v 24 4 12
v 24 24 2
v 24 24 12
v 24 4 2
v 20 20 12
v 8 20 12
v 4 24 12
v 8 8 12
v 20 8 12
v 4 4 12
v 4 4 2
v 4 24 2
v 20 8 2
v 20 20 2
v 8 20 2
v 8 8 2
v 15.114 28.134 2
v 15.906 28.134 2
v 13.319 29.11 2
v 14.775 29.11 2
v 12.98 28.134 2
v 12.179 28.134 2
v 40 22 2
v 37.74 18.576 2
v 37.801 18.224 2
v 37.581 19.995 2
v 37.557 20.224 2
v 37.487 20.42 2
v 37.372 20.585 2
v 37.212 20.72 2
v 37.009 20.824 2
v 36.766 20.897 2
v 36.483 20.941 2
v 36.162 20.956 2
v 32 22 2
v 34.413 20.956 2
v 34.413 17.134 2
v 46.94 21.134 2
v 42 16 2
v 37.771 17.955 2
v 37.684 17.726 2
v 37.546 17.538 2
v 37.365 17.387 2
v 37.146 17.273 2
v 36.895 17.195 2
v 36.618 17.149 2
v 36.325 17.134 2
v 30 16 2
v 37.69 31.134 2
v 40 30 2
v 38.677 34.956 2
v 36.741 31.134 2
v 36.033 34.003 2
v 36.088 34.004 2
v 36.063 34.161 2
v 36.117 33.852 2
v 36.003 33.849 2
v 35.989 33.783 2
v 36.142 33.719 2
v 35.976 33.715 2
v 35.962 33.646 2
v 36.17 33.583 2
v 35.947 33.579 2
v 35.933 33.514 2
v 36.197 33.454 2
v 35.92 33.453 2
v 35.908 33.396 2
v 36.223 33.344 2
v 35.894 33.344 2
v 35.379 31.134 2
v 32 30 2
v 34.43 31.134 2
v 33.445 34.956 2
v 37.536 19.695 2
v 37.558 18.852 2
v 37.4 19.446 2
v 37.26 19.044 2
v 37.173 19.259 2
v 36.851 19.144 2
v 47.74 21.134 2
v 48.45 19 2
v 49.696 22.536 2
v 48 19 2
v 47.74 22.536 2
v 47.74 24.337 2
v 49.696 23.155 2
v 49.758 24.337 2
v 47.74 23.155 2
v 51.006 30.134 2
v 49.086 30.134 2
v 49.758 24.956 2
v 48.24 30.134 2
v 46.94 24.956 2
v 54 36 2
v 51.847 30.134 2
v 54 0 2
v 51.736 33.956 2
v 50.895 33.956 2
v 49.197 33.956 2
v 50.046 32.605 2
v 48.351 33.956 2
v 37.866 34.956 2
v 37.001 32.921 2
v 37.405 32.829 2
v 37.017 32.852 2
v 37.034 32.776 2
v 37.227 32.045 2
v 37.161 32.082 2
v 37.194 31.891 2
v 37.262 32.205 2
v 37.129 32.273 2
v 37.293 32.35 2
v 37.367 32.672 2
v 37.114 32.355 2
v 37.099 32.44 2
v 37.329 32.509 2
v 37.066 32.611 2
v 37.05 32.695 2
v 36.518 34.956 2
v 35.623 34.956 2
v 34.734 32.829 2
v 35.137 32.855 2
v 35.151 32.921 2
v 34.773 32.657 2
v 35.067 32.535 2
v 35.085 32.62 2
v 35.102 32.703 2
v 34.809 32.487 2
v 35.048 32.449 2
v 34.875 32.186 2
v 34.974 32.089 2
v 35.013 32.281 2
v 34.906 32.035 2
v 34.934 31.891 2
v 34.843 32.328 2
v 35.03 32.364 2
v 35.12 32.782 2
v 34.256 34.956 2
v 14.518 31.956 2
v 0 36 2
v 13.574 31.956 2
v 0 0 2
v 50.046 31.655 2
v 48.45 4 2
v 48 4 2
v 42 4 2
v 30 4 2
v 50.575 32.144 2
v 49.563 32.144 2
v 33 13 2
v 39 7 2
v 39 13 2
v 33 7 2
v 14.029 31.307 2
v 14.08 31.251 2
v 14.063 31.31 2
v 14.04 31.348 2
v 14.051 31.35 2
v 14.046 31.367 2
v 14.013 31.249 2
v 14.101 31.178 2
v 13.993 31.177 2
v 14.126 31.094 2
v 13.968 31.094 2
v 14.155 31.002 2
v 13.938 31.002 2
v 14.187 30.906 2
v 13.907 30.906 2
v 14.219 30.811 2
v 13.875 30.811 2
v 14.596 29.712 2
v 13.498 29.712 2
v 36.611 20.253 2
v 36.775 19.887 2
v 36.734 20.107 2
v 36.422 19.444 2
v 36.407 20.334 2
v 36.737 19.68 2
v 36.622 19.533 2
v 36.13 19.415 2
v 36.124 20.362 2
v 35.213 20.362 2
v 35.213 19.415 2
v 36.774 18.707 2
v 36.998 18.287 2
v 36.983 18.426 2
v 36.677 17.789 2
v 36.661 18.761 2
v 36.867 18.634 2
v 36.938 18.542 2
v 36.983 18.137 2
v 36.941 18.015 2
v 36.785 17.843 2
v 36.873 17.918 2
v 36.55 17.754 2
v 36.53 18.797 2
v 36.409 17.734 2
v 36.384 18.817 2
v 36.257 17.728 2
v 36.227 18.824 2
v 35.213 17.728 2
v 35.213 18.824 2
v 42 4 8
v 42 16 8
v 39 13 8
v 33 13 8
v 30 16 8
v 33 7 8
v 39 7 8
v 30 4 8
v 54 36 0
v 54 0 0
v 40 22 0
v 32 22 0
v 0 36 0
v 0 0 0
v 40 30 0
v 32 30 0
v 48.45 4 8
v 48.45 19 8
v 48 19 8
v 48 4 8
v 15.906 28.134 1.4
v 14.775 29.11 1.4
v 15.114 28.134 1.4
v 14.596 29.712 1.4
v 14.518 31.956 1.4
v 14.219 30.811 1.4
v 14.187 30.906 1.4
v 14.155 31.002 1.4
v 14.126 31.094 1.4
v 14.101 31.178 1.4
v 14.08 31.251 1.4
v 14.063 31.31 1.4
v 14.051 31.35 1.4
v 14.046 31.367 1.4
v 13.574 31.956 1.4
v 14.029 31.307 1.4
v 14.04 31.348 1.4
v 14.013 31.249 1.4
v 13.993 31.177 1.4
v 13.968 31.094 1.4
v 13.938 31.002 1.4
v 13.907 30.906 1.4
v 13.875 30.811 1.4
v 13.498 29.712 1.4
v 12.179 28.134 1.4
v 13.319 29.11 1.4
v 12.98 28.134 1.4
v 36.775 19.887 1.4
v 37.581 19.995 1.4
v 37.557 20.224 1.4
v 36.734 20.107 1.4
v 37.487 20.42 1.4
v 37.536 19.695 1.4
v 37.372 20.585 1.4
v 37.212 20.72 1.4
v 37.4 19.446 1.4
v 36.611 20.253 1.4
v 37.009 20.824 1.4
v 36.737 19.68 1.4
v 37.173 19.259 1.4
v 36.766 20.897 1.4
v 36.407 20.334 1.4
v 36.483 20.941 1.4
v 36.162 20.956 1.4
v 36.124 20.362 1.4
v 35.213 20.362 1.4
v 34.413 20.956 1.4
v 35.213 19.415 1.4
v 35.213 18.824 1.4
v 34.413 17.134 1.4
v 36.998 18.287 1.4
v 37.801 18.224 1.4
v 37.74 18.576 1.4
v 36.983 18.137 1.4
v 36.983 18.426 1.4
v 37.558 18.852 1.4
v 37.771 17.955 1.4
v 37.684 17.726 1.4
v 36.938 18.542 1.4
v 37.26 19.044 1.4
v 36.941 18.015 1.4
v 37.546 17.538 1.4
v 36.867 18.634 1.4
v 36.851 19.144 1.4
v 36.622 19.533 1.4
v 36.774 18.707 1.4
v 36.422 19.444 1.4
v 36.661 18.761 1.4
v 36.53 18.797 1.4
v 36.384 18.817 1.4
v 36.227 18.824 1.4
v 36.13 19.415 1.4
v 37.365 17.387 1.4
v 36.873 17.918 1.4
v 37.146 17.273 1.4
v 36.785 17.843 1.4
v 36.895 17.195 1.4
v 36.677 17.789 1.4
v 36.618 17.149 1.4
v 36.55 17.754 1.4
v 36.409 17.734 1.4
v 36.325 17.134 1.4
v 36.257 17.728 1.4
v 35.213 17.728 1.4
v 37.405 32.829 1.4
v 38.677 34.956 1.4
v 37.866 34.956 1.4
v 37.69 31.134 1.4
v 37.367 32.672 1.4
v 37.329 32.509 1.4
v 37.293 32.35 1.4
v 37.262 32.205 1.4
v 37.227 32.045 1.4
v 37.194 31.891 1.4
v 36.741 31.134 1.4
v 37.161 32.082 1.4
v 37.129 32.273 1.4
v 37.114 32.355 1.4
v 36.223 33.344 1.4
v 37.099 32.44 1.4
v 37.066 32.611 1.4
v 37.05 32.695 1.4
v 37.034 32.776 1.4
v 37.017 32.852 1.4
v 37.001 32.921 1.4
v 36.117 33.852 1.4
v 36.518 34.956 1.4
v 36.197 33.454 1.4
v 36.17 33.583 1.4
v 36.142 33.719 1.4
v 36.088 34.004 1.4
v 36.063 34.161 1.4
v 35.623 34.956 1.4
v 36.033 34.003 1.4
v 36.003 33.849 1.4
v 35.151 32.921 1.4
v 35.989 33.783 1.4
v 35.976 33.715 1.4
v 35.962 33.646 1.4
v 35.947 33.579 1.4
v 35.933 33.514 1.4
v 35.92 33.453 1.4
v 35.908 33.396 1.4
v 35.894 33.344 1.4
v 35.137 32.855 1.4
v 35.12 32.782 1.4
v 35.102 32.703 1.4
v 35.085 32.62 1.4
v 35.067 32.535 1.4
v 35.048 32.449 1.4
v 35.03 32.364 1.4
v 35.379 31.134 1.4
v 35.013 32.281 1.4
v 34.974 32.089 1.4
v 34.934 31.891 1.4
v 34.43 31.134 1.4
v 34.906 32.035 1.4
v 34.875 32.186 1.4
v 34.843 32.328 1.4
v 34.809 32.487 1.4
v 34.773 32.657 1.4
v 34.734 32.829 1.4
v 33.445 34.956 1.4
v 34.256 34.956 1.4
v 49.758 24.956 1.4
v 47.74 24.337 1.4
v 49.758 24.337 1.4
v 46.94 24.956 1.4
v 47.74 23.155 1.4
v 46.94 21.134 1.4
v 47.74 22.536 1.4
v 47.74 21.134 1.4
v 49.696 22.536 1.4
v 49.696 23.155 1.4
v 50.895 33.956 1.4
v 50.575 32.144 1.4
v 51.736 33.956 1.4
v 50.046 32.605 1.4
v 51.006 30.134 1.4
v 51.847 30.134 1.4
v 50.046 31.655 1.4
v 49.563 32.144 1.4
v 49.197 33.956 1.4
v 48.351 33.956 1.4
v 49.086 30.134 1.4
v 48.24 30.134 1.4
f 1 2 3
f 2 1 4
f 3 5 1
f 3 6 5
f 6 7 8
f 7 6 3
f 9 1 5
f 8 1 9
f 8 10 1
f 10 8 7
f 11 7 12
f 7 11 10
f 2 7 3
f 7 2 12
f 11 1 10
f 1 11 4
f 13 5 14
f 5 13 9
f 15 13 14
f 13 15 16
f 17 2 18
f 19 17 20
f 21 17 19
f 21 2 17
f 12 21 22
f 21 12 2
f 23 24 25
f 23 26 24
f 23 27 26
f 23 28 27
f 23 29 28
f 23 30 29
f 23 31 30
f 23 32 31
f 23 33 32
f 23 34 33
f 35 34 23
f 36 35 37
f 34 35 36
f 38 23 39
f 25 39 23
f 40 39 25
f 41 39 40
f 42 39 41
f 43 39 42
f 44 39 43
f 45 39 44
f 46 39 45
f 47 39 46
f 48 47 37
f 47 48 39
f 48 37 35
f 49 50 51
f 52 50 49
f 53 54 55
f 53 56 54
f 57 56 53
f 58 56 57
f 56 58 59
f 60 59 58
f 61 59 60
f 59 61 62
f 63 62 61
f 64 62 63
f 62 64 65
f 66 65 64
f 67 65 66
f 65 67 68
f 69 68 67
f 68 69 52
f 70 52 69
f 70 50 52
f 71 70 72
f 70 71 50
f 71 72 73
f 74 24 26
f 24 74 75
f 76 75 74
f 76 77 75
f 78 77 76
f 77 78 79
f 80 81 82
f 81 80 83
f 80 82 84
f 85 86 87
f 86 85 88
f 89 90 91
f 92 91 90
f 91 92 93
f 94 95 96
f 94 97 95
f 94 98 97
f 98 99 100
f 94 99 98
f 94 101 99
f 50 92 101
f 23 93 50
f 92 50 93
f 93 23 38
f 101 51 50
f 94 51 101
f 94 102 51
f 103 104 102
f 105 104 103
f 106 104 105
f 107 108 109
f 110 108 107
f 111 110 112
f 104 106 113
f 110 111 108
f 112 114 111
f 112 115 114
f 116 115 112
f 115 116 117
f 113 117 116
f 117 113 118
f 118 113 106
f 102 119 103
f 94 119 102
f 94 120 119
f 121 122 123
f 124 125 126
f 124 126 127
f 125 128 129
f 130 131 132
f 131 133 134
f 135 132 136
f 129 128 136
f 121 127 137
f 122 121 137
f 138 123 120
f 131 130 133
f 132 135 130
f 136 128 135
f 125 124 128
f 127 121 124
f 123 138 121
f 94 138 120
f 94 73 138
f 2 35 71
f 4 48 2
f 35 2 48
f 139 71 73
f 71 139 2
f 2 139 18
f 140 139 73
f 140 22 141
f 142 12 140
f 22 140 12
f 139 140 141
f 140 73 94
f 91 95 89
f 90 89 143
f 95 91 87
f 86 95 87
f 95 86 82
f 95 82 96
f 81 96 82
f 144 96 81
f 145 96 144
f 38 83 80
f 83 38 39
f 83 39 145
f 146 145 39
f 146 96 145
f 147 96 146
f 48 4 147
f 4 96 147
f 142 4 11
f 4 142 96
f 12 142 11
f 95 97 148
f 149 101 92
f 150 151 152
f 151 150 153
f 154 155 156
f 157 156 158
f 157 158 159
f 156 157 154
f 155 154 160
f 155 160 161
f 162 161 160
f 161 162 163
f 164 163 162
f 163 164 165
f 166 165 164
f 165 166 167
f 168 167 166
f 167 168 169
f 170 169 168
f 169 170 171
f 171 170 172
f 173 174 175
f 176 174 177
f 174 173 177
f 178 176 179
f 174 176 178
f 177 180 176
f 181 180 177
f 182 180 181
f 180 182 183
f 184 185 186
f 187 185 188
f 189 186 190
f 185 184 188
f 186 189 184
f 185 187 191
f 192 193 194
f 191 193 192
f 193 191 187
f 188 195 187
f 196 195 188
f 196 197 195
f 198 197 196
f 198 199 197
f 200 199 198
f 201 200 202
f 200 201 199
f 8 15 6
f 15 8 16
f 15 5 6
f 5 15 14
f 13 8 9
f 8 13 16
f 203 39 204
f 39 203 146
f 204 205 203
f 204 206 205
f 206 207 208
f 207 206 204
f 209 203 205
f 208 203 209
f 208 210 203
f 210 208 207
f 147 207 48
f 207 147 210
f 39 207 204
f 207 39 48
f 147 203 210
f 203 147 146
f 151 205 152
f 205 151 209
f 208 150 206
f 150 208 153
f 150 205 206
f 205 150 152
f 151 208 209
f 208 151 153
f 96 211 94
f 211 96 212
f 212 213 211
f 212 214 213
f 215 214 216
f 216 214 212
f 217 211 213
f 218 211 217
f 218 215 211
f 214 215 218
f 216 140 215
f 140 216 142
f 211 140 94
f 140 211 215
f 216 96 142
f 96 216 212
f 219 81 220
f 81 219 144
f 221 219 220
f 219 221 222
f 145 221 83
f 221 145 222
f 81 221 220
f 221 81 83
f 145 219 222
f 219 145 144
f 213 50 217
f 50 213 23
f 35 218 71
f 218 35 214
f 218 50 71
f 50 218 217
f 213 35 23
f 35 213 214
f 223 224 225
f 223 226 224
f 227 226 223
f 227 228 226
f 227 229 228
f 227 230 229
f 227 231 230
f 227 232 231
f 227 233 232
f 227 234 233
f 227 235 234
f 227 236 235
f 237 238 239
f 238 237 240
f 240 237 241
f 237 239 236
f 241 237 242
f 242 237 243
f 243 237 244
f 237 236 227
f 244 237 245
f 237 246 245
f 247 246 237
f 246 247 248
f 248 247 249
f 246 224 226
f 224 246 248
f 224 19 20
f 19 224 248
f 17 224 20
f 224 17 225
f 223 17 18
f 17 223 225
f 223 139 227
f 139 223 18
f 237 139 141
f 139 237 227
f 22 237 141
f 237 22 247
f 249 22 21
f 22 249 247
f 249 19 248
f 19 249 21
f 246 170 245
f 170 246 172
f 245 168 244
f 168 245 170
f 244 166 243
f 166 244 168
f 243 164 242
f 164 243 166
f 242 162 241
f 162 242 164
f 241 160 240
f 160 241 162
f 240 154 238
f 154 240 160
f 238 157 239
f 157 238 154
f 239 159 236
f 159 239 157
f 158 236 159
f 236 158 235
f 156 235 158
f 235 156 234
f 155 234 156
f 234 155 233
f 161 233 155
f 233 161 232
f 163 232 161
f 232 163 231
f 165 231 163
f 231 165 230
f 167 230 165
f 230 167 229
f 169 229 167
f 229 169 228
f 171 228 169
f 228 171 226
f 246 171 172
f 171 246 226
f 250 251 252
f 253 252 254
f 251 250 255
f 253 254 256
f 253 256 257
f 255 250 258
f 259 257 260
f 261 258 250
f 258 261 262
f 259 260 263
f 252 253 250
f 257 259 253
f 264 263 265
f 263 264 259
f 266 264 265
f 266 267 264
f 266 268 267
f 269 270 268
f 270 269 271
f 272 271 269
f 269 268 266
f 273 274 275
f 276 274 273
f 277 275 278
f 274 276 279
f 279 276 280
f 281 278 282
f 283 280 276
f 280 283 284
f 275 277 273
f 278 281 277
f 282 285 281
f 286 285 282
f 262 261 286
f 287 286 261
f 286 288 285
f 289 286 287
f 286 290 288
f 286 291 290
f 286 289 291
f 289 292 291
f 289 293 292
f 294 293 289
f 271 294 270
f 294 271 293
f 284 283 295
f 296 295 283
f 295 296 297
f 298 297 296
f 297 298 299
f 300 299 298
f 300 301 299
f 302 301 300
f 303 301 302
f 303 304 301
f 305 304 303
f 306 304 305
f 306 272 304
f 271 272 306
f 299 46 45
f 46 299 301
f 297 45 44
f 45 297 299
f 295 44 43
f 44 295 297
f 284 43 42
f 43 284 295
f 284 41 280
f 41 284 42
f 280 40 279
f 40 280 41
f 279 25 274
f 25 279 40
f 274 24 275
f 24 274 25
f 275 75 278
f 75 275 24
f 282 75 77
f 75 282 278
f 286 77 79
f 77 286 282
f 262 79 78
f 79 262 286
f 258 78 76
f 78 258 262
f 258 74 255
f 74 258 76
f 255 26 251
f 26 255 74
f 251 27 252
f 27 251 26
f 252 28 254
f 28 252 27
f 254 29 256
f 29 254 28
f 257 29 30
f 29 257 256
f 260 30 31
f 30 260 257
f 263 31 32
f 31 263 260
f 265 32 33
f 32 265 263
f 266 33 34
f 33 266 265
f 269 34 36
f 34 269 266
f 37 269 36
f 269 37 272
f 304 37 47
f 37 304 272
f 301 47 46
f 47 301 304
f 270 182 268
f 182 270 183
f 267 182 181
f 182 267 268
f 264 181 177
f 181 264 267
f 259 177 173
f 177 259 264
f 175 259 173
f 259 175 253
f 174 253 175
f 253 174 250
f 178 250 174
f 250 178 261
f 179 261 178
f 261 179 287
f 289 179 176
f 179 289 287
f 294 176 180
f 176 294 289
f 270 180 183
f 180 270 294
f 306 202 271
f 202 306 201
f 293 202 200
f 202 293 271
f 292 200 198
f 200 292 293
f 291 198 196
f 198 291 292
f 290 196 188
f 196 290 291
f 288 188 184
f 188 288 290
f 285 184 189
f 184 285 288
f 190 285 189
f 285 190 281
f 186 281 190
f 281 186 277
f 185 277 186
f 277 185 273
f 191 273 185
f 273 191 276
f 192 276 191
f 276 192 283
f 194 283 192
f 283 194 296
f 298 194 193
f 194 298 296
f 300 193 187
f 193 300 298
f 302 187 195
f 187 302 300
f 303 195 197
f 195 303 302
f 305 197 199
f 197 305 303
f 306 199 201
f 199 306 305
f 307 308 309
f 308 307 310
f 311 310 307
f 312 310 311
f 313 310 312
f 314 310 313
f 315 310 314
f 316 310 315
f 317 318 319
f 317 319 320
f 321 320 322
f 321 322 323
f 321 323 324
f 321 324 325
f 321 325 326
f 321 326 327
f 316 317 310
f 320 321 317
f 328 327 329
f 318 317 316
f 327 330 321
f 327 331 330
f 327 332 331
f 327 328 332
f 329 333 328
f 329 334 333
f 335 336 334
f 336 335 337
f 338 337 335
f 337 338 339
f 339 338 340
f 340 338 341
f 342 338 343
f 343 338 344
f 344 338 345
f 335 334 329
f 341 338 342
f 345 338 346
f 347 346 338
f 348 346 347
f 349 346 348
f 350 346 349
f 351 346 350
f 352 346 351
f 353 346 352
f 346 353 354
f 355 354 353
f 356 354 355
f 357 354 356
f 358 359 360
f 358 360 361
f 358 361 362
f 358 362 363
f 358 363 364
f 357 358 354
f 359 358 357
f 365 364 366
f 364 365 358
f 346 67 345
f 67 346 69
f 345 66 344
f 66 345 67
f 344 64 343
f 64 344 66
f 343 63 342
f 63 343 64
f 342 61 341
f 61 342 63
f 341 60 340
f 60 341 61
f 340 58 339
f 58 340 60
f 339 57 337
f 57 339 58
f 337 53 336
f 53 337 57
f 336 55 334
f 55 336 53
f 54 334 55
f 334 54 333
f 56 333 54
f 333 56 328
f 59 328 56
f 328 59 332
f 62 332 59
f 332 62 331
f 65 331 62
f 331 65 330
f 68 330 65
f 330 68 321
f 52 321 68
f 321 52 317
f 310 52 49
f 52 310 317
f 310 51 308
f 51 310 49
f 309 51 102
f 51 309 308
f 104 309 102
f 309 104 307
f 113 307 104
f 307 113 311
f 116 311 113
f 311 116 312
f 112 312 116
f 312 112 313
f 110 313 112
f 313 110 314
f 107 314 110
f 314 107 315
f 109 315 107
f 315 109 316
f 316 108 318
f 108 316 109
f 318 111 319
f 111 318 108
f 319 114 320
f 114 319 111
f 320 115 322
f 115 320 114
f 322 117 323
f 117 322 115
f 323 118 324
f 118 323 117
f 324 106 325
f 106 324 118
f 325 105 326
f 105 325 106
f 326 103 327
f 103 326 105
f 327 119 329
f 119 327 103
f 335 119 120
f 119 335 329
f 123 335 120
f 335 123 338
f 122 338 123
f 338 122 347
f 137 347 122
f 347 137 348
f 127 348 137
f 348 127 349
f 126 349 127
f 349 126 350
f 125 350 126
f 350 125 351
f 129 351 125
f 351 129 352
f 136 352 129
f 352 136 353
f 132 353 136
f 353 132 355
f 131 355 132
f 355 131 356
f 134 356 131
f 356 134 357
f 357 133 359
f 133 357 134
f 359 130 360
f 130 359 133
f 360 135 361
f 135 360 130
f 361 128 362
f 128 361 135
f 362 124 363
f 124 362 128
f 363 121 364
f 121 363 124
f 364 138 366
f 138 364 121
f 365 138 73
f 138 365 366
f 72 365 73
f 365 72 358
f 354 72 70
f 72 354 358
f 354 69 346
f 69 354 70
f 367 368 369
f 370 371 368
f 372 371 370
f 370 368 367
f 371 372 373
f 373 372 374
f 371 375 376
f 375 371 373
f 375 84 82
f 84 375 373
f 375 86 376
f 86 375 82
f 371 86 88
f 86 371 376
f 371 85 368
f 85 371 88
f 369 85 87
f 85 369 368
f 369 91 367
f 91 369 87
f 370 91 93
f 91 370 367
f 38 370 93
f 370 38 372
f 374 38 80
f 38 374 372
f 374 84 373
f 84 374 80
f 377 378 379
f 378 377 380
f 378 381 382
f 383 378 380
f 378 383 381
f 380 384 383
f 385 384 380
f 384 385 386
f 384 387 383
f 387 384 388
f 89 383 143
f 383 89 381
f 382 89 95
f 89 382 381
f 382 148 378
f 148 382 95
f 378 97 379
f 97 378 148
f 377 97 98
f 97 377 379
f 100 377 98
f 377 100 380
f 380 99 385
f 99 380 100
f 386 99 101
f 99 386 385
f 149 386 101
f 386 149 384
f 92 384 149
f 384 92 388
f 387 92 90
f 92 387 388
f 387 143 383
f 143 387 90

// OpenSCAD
// Print coupon: the printer's piece made to be measured. A plate with two square
// blocks standing on it, a square pocket in each, a square window through the plate
// and a single-wall fin, every size a person reads with calipers, each labelled.
// Its wrapper (apothecary/projects/parts/print_coupon.py) names each feature, the
// jaws that read it and where they close; apothecary/print_tuning.py says what the
// readings imply for the printer (docs/print-tuning.md).
//
// The plate's front-left bottom corner is the origin, its long side along X. Block A
// stands at the front left, block B to its right, the fin past B; the window is
// behind B. Everything stands on the plate, so nothing needs a support. Labels are
// cut into the plate's top, clear of every face a jaw meets.
//
//   outside sizes  the plate, X and Y (the jaws take in the first layer); A and B,
//                  X and Y (above it)
//   inside sizes   A's and B's pockets, X and Y (above the first layers); the
//                  window, X and Y (through them)
//   heights        the plate's top, B's and A's, from the bed face
//   a single wall  the fin, across

/* [Plate] */
plate_x = 54;       // [40:1:120] the plate along X, its long side
plate_y = 36;       // [30:1:100] the plate along Y
plate_t = 2;        // [1:0.2:6] the plate's thickness: the first top measured

/* [Blocks] */
a_size = 20;        // [10:1:40] block A, square
a_height = 10;      // [2:0.2:30] block A above the plate
a_pocket = 12;      // [4:1:30] block A's pocket, square, down to the plate
b_size = 12;        // [8:1:30] block B, square
b_height = 6;       // [2:0.2:30] block B above the plate
b_pocket = 6;       // [3:1:20] block B's pocket, square, down to the plate

/* [Window and fin] */
window = 8;         // [4:1:20] a square window through the plate, behind B
fin_t = 0.45;       // [0.2:0.01:1.2] the fin's thickness: one line of the slicer's
fin_length = 15;    // [5:1:30] the fin along Y
fin_height = 6;     // [2:0.2:20] the fin above the plate

/* [Room] */
margin = 4;         // [3:0.5:10] from the plate's edge to what stands on it
gap = 6;            // [4:0.5:12] between two features, room for a jaw
label_depth = 0.6;  // [0.2:0.2:1] how deep a label is cut into the plate's top

/* [Hidden] */
eps = 0.01;  // what stands on the plate starts this far into it, so the two are one
label_size = 4;

a_x0 = margin;
a_y0 = margin;
b_x0 = margin + a_size + gap;
b_y0 = margin;
fin_x0 = b_x0 + b_size + gap;
fin_y0 = margin;
w_x0 = b_x0 + (b_size - window) / 2;
w_y0 = margin + b_size + gap;

module block(x0, y0, size, height, pocket) {
    difference() {
        translate([x0, y0, plate_t - eps]) cube([size, size, height + eps]);
        translate([x0 + (size - pocket) / 2, y0 + (size - pocket) / 2, plate_t])
            cube([pocket, pocket, height + 1]);
    }
}

module label(t, x, y) {
    translate([x, y, plate_t - label_depth])
        linear_extrude(label_depth + 1)
            text(t, size = label_size, halign = "center", valign = "center",
                 font = "Liberation Sans:style=Bold");
}

module coupon() {
    difference() {
        union() {
            cube([plate_x, plate_y, plate_t]);
            block(a_x0, a_y0, a_size, a_height, a_pocket);
            block(b_x0, b_y0, b_size, b_height, b_pocket);
            translate([fin_x0, fin_y0, plate_t - eps])
                cube([fin_t, fin_length, fin_height + eps]);
        }
        translate([w_x0, w_y0, -1]) cube([window, window, plate_t + 2]);
        label("A", a_x0 + a_size / 2, (a_y0 + a_size + plate_y) / 2);
        label("B", b_x0 + b_size / 2, margin + b_size + gap / 2);
        label("W", w_x0 + window / 2, (w_y0 + window + plate_y) / 2);
        label("F", fin_x0 + fin_t / 2, fin_y0 + fin_length + gap / 2 + 1);
        label("X", plate_x - margin, plate_y - margin);
    }
}

coupon();
